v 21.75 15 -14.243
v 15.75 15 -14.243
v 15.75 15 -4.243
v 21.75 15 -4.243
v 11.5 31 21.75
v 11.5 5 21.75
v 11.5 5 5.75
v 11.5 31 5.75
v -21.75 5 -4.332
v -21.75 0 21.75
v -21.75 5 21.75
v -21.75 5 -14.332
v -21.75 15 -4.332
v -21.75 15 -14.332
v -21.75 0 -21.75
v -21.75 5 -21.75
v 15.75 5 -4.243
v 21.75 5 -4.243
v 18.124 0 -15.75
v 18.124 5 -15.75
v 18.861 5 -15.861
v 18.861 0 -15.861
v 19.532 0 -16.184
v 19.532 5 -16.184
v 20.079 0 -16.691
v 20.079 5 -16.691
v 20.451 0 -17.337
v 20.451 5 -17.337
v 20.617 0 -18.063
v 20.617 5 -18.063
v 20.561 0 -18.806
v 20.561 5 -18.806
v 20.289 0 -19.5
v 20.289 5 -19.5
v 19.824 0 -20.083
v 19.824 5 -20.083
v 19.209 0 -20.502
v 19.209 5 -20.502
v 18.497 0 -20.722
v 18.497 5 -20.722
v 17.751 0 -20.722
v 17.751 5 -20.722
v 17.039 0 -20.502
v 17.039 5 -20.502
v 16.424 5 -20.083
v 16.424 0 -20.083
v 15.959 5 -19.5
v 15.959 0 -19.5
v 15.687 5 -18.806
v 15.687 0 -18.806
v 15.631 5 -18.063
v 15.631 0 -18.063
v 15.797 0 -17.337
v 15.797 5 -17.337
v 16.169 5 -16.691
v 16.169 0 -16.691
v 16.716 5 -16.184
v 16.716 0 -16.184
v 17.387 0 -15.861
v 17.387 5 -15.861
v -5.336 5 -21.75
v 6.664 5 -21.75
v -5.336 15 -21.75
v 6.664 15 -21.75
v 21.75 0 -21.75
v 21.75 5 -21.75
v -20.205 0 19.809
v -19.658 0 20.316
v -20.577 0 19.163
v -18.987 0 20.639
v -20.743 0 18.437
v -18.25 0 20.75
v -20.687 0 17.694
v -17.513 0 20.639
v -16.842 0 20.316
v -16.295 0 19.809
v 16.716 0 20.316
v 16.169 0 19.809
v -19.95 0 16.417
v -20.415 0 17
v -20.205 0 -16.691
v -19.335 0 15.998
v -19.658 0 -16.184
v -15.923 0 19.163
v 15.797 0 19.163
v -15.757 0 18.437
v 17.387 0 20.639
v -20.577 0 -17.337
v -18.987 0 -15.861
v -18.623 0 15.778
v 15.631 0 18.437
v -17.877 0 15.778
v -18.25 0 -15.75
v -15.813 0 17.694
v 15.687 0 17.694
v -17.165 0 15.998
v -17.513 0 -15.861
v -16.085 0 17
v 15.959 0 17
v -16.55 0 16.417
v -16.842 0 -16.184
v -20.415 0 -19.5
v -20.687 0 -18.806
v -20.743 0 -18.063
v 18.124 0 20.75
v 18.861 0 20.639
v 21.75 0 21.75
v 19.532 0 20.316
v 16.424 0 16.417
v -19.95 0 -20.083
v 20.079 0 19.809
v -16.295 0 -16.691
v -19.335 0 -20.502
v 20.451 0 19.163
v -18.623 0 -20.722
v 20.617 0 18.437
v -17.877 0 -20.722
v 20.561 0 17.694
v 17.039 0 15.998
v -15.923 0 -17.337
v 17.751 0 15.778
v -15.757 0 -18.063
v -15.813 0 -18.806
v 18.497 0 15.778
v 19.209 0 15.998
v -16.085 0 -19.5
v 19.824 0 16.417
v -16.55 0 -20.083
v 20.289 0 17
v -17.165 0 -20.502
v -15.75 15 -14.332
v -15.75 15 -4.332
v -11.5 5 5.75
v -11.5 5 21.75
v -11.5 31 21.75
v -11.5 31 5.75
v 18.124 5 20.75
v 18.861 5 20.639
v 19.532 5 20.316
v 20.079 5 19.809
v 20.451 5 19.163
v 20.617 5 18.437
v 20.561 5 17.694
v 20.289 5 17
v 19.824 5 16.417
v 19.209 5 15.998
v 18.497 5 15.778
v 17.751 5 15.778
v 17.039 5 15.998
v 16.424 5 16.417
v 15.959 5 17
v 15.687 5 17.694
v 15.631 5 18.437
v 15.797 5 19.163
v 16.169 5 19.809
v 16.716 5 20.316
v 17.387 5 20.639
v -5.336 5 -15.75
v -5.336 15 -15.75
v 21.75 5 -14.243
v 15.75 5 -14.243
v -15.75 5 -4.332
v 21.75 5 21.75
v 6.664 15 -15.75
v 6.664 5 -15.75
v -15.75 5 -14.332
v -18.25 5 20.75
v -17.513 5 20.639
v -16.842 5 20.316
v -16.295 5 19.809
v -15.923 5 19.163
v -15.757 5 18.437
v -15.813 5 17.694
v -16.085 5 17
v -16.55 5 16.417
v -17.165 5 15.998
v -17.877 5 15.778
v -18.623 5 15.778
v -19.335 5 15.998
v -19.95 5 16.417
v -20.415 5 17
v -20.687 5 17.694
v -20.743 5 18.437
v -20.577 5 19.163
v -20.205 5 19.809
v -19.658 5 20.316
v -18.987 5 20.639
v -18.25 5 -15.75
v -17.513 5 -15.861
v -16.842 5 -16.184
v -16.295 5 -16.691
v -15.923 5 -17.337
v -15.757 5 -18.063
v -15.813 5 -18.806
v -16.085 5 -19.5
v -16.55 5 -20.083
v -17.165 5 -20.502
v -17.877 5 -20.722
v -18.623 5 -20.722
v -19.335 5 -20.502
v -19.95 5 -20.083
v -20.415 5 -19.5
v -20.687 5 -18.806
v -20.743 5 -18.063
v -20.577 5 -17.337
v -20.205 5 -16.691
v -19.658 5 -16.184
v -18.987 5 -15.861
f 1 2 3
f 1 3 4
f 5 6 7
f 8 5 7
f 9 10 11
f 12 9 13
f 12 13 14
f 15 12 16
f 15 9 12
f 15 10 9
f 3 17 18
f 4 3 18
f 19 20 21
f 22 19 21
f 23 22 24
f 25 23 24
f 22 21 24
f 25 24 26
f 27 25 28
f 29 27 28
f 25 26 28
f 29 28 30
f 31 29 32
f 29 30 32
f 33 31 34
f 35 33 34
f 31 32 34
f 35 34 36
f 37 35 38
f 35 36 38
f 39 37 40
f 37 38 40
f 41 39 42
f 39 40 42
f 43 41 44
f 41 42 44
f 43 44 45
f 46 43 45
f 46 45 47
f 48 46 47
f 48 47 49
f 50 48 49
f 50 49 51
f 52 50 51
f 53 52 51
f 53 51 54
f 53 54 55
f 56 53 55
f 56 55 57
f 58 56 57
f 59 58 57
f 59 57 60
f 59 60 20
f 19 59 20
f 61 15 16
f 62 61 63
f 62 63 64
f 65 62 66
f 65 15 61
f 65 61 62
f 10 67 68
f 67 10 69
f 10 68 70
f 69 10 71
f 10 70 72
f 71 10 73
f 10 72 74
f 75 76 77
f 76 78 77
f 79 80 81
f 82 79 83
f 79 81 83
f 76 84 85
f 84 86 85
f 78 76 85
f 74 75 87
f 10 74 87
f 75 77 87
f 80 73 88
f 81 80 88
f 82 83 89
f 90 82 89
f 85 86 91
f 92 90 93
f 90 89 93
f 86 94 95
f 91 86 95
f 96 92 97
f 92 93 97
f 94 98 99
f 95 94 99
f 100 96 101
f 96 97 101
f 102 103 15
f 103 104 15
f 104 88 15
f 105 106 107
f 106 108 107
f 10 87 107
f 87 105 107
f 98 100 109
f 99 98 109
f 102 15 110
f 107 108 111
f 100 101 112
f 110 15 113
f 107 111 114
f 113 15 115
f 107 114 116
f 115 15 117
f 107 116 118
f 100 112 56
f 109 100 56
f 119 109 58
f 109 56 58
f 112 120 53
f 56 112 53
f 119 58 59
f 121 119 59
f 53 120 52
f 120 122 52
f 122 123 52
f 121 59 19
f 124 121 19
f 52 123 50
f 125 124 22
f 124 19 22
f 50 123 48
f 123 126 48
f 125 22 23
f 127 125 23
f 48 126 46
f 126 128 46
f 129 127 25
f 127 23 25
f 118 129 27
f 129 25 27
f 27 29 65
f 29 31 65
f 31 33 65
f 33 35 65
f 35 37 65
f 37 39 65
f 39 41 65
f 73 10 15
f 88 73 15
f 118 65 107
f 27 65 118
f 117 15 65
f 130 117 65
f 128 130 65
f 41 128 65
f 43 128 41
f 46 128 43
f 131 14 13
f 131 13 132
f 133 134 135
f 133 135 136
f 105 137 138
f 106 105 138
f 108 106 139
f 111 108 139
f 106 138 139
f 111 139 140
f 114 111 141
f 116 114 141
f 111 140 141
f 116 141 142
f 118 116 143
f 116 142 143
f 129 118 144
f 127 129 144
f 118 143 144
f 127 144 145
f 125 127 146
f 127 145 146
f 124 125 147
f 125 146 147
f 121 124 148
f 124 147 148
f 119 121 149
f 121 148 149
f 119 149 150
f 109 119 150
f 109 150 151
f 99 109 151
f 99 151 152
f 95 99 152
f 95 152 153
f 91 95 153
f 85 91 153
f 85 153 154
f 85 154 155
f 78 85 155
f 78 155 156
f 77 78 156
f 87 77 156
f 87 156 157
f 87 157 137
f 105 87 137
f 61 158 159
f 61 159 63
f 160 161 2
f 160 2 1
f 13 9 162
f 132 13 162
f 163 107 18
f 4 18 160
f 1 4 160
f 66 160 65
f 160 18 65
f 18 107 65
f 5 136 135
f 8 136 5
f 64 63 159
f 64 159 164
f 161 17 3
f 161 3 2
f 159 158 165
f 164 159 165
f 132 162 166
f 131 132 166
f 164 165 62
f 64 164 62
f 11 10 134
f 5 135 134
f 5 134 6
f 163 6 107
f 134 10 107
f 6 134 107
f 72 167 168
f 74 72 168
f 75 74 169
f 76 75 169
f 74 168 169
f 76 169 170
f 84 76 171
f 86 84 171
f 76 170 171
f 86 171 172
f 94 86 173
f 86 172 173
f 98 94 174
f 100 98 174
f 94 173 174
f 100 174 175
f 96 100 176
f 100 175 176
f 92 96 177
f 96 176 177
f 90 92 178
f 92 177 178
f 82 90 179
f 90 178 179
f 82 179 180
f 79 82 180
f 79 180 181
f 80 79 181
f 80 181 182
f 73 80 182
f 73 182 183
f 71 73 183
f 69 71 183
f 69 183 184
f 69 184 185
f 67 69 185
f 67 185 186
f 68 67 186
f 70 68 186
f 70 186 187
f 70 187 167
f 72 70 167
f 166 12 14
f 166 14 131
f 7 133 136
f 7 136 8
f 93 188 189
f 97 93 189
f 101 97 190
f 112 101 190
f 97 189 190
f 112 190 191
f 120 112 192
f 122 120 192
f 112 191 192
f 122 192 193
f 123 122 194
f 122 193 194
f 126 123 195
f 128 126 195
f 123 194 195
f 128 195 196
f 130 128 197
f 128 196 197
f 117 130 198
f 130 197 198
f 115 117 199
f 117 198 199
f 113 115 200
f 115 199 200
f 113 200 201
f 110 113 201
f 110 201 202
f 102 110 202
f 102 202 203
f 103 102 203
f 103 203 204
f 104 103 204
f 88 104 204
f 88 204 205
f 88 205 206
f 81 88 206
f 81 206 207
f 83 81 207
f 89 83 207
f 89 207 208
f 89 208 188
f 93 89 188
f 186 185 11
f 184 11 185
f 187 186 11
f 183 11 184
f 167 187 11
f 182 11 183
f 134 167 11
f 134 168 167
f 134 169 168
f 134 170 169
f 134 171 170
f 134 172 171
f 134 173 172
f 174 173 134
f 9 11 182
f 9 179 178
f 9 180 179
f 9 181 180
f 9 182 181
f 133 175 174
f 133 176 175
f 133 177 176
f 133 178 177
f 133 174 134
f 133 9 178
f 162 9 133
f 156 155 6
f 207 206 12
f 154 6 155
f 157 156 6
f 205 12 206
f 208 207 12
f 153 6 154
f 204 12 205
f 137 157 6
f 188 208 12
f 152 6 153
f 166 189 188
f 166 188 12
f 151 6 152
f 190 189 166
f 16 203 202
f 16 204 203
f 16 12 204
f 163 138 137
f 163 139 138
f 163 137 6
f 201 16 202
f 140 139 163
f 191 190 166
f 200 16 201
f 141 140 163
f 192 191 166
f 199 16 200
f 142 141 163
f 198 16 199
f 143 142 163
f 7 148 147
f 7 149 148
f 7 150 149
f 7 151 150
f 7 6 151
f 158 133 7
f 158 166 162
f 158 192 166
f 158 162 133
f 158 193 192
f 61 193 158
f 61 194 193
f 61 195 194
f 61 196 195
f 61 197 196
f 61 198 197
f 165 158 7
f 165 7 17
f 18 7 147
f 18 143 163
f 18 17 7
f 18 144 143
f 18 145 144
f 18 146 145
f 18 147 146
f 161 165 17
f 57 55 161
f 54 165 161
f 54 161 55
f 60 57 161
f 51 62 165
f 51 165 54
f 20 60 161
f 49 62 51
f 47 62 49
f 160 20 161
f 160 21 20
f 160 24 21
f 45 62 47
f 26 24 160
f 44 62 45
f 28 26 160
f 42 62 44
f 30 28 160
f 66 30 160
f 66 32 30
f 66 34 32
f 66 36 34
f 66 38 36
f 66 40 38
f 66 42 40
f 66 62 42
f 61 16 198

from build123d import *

# Parameters (mm, degrees)
SKETCH2_W           = 43.5
SKETCH2_H           = 43.5
BOSS_EXTRUDE1_DEPTH = 5
SKETCH4_W           = 23
SKETCH4_H           = 16
BOSS_EXTRUDE2_DEPTH = 26
SKETCH5_W           = 6
SKETCH5_H           = 10
SKETCH5_W_2         = 12
SKETCH5_H_2         = 6
BOSS_EXTRUDE3_DEPTH = 10
SKETCH6_R           = 2.5
CUT_EXTRUDE1_DEPTH  = 41.275612969


with BuildPart() as part:
    # Sketch2 → Boss-Extrude1 (new body)
    with BuildSketch(Plane(origin=(0, 0, 0), x_dir=(1, 0, 0), z_dir=(0, 1, 0))):
        Rectangle(SKETCH2_W, SKETCH2_H)
    extrude(amount=BOSS_EXTRUDE1_DEPTH)

    # Sketch4 → Boss-Extrude2 (add)
    with BuildSketch(Plane(origin=(0, 5, 0), x_dir=(1, 0, 0), z_dir=(0, 1, 0))):
        with Locations((0, -13.75)):
            Rectangle(SKETCH4_W, SKETCH4_H)
    extrude(amount=BOSS_EXTRUDE2_DEPTH)

    # Sketch5 → Boss-Extrude3 (add)
    with BuildSketch(Plane(origin=(0, 5, 0), x_dir=(1, 0, 0), z_dir=(0, 1, 0))):
        with Locations((-18.75, 9.331650707)):
            Rectangle(SKETCH5_W, SKETCH5_H)
        with Locations((0.664199044, 18.75)):
            Rectangle(SKETCH5_W_2, SKETCH5_H_2)
        with Locations((18.75, 9.243455857)):
            Rectangle(SKETCH5_W, SKETCH5_H)
    extrude(amount=BOSS_EXTRUDE3_DEPTH)

    # Sketch6 → Cut-Extrude1 (cut, through all)
    with BuildSketch(Plane(origin=(0, 5, 0), x_dir=(1, 0, 0), z_dir=(0, 1, 0))):
        with Locations(Location((-18.25, 18.25, 0), (0, 0, 270))):
            Circle(SKETCH6_R)
        with Locations(Location((18.124031363, 18.25, 0), (0, 0, 270))):
            Circle(SKETCH6_R)
        with Locations(Location((18.124031363, -18.25, 0), (0, 0, 270))):
            Circle(SKETCH6_R)
        with Locations(Location((-18.25, -18.25, 0), (0, 0, 270))):
            Circle(SKETCH6_R)
    extrude(amount=-CUT_EXTRUDE1_DEPTH, mode=Mode.SUBTRACT)


solid = part.part
